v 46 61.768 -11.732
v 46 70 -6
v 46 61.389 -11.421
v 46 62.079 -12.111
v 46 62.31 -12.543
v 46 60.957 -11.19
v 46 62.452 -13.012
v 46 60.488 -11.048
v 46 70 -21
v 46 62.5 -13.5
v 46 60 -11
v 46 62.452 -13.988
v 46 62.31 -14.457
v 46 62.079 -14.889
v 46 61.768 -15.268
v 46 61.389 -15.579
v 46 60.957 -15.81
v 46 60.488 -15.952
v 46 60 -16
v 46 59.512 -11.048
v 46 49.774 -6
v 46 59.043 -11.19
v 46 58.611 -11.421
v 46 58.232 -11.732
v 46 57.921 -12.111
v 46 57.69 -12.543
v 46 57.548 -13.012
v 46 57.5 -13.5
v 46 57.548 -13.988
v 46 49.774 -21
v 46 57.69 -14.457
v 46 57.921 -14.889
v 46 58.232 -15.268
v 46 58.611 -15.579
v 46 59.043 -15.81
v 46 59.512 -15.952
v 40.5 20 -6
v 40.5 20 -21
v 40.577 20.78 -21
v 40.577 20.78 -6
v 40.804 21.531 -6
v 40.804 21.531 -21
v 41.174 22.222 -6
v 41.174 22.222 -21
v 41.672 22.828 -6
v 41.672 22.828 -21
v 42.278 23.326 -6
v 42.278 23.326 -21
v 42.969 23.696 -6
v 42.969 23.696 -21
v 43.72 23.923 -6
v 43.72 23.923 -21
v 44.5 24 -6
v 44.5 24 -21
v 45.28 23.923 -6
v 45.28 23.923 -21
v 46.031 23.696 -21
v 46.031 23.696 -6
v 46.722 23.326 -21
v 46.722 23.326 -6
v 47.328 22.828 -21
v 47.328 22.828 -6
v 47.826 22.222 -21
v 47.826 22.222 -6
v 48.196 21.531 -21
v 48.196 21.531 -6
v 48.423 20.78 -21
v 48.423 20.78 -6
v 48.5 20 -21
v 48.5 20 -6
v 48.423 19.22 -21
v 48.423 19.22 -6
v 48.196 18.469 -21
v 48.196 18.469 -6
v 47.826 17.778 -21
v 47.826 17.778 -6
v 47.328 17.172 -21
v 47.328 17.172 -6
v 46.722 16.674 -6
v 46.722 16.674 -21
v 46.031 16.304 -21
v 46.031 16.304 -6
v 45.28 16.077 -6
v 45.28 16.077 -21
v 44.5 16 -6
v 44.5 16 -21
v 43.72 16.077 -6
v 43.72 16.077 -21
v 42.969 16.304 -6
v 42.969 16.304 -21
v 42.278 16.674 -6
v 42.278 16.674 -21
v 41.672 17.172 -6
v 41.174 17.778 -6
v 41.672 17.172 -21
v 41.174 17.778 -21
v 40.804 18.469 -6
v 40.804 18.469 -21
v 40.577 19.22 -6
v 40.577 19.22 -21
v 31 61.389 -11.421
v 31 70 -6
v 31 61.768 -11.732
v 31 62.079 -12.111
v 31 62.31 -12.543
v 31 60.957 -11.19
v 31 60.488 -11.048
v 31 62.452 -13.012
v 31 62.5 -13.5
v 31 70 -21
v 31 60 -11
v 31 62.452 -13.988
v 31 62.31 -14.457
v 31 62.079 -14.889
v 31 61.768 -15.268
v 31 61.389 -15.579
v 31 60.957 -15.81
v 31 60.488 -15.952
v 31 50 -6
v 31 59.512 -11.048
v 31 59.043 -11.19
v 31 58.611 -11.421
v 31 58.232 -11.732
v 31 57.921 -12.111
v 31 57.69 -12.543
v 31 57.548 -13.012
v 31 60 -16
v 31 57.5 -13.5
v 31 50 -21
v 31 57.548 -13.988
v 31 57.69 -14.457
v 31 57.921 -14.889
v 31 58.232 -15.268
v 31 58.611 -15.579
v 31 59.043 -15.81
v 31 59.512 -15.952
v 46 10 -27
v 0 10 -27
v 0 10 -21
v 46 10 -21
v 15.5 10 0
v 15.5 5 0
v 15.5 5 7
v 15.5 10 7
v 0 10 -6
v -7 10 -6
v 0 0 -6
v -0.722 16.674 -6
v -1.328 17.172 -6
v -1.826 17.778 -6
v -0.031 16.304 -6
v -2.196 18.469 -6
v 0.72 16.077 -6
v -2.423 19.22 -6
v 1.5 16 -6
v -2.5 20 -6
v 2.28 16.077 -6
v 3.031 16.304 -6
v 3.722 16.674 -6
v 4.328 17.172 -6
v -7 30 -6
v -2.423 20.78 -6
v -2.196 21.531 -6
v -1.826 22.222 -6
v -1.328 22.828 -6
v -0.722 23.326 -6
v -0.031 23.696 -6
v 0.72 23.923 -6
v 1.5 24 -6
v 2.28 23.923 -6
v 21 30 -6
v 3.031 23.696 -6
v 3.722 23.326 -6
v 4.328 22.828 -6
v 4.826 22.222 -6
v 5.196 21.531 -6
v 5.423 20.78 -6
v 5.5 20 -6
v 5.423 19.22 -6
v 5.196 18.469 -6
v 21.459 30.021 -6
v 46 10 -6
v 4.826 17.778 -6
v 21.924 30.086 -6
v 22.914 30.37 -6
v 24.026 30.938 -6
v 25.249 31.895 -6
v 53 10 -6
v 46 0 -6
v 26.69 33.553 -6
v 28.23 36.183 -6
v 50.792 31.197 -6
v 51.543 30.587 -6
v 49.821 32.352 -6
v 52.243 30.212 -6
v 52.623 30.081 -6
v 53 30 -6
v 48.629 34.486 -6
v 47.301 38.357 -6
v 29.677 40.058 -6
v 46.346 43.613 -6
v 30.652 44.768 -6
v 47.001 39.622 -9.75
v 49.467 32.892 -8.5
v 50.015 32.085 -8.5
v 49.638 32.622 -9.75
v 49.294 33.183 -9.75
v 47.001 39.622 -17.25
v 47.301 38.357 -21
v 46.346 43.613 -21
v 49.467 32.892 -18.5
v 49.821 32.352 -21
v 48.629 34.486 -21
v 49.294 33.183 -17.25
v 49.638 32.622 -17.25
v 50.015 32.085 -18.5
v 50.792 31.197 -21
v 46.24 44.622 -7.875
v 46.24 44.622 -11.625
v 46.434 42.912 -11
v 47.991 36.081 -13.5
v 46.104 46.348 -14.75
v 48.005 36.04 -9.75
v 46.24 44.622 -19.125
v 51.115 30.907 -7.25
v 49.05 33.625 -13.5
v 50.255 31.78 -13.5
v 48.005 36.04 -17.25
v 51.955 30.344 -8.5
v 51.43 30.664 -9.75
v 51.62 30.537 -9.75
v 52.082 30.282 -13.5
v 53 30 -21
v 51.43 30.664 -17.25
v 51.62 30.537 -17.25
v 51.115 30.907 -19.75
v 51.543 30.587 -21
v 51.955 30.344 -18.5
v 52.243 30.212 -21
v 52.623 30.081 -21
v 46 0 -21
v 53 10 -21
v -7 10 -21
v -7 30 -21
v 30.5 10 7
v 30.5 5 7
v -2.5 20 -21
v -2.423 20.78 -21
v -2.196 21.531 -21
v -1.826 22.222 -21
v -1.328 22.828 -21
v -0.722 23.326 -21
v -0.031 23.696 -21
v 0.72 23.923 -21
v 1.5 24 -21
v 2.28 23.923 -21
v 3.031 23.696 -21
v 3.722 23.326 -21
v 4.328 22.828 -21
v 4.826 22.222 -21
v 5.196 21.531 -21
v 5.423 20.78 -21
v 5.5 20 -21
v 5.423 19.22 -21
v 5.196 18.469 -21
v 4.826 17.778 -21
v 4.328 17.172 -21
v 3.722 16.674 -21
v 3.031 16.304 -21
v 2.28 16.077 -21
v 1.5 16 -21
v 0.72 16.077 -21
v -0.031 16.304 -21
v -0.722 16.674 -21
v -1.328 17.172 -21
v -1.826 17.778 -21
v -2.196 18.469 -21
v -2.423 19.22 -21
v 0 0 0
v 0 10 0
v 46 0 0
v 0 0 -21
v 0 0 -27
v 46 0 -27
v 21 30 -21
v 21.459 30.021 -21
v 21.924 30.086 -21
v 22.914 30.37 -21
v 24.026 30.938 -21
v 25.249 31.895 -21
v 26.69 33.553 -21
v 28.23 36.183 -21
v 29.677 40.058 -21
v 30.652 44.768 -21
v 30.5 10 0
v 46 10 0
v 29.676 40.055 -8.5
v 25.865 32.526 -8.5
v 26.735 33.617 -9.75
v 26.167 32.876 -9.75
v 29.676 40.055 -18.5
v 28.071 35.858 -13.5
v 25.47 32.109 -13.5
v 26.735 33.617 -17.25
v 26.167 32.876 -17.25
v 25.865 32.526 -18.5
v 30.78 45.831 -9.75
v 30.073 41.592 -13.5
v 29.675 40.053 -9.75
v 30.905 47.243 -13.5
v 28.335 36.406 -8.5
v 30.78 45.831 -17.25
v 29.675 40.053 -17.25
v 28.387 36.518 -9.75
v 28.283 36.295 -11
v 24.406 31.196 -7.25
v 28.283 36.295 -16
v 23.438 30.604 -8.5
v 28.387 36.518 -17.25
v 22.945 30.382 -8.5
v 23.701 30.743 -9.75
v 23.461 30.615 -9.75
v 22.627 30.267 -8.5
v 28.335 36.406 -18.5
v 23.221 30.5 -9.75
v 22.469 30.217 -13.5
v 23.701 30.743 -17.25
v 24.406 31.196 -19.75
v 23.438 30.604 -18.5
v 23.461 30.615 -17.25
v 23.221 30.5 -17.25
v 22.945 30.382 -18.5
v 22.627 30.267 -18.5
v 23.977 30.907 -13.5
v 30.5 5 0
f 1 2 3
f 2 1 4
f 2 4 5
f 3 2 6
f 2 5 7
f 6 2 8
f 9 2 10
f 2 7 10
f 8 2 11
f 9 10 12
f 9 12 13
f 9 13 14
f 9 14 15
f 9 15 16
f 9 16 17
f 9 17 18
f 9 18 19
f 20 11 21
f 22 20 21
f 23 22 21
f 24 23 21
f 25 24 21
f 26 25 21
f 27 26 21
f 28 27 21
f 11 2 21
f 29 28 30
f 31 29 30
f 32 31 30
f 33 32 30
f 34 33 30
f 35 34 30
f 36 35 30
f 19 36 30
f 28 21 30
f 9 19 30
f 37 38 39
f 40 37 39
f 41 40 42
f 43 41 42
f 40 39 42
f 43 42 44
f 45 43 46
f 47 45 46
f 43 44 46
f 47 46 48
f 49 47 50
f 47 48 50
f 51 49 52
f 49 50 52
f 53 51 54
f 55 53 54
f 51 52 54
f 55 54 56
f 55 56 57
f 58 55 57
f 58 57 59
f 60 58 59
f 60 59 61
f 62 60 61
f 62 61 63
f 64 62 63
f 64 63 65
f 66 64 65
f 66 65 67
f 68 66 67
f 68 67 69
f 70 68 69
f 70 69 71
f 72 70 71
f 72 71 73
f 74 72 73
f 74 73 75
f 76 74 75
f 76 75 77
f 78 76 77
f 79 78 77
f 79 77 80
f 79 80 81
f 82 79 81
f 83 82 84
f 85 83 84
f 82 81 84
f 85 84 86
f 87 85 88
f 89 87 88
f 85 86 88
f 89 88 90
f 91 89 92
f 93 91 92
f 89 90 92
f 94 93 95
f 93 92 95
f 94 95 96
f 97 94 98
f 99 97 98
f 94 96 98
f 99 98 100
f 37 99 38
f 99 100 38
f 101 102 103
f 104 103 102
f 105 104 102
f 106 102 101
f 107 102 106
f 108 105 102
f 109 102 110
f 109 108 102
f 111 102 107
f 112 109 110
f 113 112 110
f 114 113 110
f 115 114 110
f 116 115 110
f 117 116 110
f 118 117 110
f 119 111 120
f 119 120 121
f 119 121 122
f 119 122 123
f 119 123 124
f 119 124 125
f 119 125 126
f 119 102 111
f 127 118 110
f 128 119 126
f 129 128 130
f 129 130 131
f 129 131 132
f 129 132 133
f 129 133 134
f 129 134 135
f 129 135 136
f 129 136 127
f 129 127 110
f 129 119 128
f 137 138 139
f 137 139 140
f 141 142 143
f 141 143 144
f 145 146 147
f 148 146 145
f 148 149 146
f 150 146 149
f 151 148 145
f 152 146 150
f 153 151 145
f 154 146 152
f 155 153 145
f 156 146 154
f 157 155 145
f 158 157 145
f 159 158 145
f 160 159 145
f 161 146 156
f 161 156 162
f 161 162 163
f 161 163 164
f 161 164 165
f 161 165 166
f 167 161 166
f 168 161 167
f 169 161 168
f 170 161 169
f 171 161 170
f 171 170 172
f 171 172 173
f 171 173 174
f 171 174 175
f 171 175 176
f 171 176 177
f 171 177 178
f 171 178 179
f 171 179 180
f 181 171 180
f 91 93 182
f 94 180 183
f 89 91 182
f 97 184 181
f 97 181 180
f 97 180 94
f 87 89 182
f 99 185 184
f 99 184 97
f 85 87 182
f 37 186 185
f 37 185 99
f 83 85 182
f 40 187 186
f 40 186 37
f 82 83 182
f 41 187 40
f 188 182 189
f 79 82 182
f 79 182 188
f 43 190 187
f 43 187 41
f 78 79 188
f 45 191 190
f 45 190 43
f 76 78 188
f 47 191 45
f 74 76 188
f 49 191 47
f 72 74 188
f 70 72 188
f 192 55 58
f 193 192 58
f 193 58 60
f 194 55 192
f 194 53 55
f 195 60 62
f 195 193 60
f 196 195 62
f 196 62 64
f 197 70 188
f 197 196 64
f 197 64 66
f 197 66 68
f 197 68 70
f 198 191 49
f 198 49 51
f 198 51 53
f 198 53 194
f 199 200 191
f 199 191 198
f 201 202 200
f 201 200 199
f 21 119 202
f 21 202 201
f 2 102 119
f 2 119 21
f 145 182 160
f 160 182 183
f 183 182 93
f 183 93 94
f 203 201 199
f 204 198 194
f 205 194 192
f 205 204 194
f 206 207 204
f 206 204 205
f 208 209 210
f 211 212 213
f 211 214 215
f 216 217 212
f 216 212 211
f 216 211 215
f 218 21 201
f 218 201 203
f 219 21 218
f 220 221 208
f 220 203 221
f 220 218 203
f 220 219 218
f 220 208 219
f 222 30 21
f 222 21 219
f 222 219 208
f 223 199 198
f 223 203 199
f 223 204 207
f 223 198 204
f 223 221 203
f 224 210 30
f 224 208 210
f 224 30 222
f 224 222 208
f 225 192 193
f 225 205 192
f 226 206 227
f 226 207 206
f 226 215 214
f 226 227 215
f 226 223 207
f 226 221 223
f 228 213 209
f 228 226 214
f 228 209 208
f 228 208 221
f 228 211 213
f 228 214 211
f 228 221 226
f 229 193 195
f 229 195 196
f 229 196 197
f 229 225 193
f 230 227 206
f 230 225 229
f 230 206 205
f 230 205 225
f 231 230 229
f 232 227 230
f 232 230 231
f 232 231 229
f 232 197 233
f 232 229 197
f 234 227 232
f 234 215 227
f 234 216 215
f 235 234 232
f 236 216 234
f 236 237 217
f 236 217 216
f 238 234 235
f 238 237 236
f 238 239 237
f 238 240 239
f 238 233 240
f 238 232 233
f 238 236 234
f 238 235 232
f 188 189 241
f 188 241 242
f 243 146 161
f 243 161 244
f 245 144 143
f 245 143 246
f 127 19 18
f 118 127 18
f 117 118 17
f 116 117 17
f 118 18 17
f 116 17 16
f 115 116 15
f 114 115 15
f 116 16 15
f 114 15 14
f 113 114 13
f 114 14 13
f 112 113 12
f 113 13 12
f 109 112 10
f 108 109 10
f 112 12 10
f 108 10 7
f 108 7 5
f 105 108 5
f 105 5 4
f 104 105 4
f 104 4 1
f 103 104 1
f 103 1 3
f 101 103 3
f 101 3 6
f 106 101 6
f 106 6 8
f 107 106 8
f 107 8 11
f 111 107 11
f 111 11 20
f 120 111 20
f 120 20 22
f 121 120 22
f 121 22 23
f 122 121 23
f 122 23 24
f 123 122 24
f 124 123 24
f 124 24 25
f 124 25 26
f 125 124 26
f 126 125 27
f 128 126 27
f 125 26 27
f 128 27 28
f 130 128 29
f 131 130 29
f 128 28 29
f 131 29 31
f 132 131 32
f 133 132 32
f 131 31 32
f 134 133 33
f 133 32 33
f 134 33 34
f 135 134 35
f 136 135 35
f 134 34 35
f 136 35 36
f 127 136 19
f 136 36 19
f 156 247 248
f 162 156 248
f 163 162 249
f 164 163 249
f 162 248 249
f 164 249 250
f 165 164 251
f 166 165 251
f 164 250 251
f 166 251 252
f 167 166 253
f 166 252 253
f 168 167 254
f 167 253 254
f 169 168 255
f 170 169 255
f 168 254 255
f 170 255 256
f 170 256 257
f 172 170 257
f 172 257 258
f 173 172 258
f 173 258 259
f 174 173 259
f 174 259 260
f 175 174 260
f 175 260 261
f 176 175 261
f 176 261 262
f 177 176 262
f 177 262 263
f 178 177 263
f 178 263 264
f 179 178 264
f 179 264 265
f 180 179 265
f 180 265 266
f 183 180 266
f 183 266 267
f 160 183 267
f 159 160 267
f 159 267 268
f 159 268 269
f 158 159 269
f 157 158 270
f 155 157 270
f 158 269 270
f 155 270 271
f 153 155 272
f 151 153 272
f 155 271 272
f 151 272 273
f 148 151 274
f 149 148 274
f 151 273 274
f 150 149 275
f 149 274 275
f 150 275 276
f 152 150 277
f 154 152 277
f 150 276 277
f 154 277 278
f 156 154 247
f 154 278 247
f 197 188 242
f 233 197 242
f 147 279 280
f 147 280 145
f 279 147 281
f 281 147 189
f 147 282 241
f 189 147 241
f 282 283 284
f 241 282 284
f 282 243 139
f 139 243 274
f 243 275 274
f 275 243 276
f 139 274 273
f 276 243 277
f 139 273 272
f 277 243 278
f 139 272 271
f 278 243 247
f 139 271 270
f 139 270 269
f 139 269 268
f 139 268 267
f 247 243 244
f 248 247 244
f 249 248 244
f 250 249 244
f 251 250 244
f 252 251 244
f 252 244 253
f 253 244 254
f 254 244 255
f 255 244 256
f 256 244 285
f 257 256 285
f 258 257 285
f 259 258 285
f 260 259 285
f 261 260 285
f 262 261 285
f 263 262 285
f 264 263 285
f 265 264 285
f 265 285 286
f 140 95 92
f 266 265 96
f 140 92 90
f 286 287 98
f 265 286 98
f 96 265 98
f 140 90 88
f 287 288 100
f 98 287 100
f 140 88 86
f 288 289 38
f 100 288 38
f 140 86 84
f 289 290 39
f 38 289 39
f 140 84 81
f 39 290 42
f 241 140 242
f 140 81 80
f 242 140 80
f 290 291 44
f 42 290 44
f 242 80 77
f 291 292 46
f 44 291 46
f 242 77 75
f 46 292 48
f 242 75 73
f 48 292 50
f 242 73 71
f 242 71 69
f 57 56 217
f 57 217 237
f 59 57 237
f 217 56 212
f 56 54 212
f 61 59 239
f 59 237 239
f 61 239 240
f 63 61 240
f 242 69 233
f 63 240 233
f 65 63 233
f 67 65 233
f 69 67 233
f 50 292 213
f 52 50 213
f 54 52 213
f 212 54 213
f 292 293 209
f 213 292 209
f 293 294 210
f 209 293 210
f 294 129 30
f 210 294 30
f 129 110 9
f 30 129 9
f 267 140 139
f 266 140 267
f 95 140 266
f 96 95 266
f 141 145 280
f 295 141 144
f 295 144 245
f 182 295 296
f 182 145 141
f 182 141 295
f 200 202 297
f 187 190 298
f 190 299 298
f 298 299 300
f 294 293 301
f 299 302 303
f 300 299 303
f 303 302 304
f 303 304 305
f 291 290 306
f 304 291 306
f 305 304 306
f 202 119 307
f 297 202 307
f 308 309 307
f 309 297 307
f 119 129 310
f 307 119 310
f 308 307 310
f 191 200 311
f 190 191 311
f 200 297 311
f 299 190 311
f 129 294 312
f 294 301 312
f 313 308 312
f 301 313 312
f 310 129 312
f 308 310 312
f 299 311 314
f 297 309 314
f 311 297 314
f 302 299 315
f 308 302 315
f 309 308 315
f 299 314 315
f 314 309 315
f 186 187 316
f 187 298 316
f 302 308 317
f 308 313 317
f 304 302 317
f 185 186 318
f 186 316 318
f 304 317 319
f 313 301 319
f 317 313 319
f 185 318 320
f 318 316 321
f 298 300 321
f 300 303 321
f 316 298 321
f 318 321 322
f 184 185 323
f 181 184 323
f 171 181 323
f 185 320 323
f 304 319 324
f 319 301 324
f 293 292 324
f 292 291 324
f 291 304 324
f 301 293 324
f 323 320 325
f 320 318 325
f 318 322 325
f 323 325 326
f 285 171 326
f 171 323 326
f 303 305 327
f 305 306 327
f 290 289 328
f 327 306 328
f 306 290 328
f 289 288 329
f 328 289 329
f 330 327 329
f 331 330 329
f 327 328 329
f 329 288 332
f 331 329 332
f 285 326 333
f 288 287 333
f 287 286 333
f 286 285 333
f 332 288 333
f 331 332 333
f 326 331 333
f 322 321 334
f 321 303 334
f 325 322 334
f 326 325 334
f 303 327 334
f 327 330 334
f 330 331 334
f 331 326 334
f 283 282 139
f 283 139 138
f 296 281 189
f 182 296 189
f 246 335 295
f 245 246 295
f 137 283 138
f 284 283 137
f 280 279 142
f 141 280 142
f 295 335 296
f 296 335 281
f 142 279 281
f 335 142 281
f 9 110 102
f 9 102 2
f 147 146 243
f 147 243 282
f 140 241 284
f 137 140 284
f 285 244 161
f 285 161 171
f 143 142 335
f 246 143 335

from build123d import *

# Parameters (mm, degrees)
SKETCH1_W           = 46
SKETCH1_H           = 27
BOSS_EXTRUDE1_DEPTH = 10
SKETCH2_W           = 60
SKETCH2_H           = 15
BOSS_EXTRUDE2_DEPTH = 20
SKETCH3_R           = 4
CUT_EXTRUDE2_DEPTH  = 65.420493634
SKETCH6_W           = 15
SKETCH6_H           = 5
BOSS_EXTRUDE4_DEPTH = 7
BOSS_EXTRUDE5_START = -21
BOSS_EXTRUDE5_DEPTH = 15
BOSS_EXTRUDE6_START = -21
BOSS_EXTRUDE6_DEPTH = 15
SKETCH12_W          = 15
SKETCH12_H          = 15
BOSS_EXTRUDE8_DEPTH = 40
SKETCH13_R          = 2.5
CUT_EXTRUDE4_DEPTH  = 40
FILLET1_START       = -21
FILLET1_DEPTH       = 15


with BuildPart() as part:
    # Sketch1 → Boss-Extrude1 (new body)
    with BuildSketch(Plane(origin=(0, 0, 0), x_dir=(1, 0, 0), z_dir=(0, 1, 0))):
        with Locations((23, 13.5)):
            Rectangle(SKETCH1_W, SKETCH1_H)
    extrude(amount=BOSS_EXTRUDE1_DEPTH)

    # Sketch2 → Boss-Extrude2 (add)
    with BuildSketch(Plane(origin=(0, 10, 0), x_dir=(1, 0, 0), z_dir=(0, 1, 0))):
        with Locations((23, 13.5)):
            Rectangle(SKETCH2_W, SKETCH2_H)
    extrude(amount=BOSS_EXTRUDE2_DEPTH)

    # Sketch3 → Cut-Extrude2 (cut, through all)
    with BuildSketch(Plane(origin=(0, 0, -21), x_dir=(-1, 0, 0), z_dir=(0, 0, -1))):
        with Locations((-44.5, 20)):
            Circle(SKETCH3_R)
        with Locations((-1.5, 20)):
            Circle(SKETCH3_R)
    extrude(amount=-CUT_EXTRUDE2_DEPTH, mode=Mode.SUBTRACT)

    # Sketch6 → Boss-Extrude4 (add)
    with BuildSketch(Plane.XY):
        with Locations((23, 7.5)):
            Rectangle(SKETCH6_W, SKETCH6_H)
    extrude(amount=BOSS_EXTRUDE4_DEPTH)

    # Boss-Extrude5: read off the stored shape, not the designer's step
    # Boss-Extrude5 outline → Boss-Extrude5 (add)
    with BuildSketch(Plane.XY.offset(BOSS_EXTRUDE5_START)):
        Polygon((-7, 10), (0, 0), (0, 10), align=None)
    extrude(amount=BOSS_EXTRUDE5_DEPTH)

    # Boss-Extrude6: read off the stored shape, not the designer's step
    # Boss-Extrude6 outline → Boss-Extrude6 (add)
    with BuildSketch(Plane.XY.offset(BOSS_EXTRUDE6_START)):
        Polygon((46, 0), (53, 10), (46, 10), align=None)
    extrude(amount=BOSS_EXTRUDE6_DEPTH)

    # Sketch12 → Boss-Extrude8 (add)
    with BuildSketch(Plane(origin=(0, 30, 0), x_dir=(1, 0, 0), z_dir=(0, 1, 0))):
        with Locations((38.5, 13.5)):
            Rectangle(SKETCH12_W, SKETCH12_H)
    extrude(amount=BOSS_EXTRUDE8_DEPTH)

    # Sketch13 → Cut-Extrude4 (cut)
    with BuildSketch(Plane(origin=(46, 0, 0), x_dir=(0, 0, -1), z_dir=(1, 0, 0))):
        with Locations((13.5, 60)):
            Circle(SKETCH13_R)
    extrude(amount=-CUT_EXTRUDE4_DEPTH, mode=Mode.SUBTRACT)

    # Fillet1: read off the stored shape, not the designer's step
    # Fillet1 outline → Fillet1 (add)
    with BuildSketch(Plane.XY.offset(FILLET1_START)):
        with BuildLine():
            Line((31, 30), (31, 50))
            add(Edge.make_bspline(
                [(31, 50), (31, 30), (21, 30)],
                knots=[0, 0, 0, 1, 1, 1], degree=2, weights=[1, 0.707106781, 1]))
            Line((21, 30), (31, 30))
        make_face()
        with BuildLine():
            add(Edge.make_bspline(
                [(46, 49.773719933), (46, 31.062015649), (53, 30)],
                knots=[0, 0, 0, 1, 1, 1], degree=2, weights=[1, 0.758287544, 1]))
            Line((46, 49.773719933), (46, 30))
            Line((46, 30), (53, 30))
        make_face()
    extrude(amount=FILLET1_DEPTH)


solid = part.part
